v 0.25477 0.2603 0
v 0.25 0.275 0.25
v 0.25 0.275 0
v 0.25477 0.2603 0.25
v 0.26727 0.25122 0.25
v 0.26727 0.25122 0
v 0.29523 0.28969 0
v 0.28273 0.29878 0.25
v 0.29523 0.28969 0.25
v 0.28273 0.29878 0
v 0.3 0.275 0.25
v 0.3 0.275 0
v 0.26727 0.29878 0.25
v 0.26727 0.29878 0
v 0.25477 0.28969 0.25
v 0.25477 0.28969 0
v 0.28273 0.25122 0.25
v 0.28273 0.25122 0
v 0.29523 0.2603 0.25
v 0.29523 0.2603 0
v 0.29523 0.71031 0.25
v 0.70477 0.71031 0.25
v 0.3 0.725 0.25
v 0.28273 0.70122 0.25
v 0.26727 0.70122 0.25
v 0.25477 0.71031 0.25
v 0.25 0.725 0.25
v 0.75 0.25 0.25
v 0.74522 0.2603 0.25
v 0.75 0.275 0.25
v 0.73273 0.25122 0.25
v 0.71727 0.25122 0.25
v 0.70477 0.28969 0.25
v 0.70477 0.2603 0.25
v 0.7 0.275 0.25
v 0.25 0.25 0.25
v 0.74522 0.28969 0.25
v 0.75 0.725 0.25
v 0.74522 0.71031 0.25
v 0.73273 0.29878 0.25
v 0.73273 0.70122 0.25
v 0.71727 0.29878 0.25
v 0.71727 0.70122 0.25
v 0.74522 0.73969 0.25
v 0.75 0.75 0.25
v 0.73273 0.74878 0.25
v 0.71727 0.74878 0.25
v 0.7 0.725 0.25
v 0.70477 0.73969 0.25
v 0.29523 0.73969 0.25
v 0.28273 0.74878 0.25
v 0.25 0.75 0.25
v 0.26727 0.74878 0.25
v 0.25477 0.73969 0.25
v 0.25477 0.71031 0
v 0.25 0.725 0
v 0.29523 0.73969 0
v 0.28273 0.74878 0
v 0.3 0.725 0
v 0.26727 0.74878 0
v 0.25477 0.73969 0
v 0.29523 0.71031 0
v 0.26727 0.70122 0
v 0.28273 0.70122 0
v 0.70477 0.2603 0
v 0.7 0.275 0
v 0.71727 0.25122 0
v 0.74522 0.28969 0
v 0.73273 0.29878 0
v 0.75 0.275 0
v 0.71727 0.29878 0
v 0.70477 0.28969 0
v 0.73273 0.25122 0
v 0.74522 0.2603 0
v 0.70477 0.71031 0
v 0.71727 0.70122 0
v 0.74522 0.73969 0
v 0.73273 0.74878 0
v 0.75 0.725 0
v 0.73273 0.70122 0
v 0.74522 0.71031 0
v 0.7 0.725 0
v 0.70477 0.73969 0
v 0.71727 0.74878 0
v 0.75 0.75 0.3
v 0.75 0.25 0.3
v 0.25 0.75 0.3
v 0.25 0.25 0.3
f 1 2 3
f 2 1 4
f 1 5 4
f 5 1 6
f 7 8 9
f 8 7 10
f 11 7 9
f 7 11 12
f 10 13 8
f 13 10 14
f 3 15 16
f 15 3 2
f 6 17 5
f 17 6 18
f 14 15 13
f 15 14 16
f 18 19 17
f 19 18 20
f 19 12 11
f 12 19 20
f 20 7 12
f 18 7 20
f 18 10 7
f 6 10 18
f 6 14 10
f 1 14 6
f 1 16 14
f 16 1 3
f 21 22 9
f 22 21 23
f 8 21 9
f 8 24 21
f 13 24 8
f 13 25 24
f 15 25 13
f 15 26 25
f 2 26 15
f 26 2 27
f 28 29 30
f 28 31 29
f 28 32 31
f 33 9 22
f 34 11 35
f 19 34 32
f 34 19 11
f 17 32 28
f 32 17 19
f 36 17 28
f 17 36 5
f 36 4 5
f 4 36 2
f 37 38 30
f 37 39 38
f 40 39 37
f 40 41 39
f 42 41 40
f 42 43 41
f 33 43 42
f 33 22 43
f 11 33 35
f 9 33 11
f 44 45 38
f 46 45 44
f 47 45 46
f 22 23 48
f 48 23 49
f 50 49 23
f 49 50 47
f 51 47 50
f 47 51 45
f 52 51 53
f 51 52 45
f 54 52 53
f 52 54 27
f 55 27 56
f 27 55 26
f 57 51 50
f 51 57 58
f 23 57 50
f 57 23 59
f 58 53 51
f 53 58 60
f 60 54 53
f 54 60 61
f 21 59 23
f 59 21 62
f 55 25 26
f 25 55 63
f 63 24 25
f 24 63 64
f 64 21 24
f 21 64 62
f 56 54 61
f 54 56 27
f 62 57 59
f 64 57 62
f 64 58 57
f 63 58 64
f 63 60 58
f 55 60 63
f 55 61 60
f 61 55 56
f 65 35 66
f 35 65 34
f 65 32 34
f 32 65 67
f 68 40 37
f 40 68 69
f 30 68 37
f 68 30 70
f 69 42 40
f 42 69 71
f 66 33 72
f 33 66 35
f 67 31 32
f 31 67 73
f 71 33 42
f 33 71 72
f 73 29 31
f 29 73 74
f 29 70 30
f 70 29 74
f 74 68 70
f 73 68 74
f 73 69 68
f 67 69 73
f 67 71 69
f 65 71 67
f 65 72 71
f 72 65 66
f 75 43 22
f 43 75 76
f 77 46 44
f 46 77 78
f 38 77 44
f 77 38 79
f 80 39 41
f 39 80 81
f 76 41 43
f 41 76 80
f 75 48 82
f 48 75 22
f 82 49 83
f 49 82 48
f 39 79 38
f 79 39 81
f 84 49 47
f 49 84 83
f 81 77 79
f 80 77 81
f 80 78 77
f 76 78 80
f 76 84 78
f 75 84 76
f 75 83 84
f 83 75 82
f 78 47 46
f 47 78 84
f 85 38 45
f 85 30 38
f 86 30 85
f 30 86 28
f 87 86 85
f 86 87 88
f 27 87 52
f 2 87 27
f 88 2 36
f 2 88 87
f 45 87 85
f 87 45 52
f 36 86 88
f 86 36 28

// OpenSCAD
translate([.25, .25, 0]) {
    
    translate([0,0,.25])
    cube([.5, 0.5, 0.05]);
        // Legs
    for(x=[0.025, 0.475])
    for(y=[0.025, 0.475])
    translate([x, y, 0])
    cylinder(0.25, r=0.025, $fn=10);

}
